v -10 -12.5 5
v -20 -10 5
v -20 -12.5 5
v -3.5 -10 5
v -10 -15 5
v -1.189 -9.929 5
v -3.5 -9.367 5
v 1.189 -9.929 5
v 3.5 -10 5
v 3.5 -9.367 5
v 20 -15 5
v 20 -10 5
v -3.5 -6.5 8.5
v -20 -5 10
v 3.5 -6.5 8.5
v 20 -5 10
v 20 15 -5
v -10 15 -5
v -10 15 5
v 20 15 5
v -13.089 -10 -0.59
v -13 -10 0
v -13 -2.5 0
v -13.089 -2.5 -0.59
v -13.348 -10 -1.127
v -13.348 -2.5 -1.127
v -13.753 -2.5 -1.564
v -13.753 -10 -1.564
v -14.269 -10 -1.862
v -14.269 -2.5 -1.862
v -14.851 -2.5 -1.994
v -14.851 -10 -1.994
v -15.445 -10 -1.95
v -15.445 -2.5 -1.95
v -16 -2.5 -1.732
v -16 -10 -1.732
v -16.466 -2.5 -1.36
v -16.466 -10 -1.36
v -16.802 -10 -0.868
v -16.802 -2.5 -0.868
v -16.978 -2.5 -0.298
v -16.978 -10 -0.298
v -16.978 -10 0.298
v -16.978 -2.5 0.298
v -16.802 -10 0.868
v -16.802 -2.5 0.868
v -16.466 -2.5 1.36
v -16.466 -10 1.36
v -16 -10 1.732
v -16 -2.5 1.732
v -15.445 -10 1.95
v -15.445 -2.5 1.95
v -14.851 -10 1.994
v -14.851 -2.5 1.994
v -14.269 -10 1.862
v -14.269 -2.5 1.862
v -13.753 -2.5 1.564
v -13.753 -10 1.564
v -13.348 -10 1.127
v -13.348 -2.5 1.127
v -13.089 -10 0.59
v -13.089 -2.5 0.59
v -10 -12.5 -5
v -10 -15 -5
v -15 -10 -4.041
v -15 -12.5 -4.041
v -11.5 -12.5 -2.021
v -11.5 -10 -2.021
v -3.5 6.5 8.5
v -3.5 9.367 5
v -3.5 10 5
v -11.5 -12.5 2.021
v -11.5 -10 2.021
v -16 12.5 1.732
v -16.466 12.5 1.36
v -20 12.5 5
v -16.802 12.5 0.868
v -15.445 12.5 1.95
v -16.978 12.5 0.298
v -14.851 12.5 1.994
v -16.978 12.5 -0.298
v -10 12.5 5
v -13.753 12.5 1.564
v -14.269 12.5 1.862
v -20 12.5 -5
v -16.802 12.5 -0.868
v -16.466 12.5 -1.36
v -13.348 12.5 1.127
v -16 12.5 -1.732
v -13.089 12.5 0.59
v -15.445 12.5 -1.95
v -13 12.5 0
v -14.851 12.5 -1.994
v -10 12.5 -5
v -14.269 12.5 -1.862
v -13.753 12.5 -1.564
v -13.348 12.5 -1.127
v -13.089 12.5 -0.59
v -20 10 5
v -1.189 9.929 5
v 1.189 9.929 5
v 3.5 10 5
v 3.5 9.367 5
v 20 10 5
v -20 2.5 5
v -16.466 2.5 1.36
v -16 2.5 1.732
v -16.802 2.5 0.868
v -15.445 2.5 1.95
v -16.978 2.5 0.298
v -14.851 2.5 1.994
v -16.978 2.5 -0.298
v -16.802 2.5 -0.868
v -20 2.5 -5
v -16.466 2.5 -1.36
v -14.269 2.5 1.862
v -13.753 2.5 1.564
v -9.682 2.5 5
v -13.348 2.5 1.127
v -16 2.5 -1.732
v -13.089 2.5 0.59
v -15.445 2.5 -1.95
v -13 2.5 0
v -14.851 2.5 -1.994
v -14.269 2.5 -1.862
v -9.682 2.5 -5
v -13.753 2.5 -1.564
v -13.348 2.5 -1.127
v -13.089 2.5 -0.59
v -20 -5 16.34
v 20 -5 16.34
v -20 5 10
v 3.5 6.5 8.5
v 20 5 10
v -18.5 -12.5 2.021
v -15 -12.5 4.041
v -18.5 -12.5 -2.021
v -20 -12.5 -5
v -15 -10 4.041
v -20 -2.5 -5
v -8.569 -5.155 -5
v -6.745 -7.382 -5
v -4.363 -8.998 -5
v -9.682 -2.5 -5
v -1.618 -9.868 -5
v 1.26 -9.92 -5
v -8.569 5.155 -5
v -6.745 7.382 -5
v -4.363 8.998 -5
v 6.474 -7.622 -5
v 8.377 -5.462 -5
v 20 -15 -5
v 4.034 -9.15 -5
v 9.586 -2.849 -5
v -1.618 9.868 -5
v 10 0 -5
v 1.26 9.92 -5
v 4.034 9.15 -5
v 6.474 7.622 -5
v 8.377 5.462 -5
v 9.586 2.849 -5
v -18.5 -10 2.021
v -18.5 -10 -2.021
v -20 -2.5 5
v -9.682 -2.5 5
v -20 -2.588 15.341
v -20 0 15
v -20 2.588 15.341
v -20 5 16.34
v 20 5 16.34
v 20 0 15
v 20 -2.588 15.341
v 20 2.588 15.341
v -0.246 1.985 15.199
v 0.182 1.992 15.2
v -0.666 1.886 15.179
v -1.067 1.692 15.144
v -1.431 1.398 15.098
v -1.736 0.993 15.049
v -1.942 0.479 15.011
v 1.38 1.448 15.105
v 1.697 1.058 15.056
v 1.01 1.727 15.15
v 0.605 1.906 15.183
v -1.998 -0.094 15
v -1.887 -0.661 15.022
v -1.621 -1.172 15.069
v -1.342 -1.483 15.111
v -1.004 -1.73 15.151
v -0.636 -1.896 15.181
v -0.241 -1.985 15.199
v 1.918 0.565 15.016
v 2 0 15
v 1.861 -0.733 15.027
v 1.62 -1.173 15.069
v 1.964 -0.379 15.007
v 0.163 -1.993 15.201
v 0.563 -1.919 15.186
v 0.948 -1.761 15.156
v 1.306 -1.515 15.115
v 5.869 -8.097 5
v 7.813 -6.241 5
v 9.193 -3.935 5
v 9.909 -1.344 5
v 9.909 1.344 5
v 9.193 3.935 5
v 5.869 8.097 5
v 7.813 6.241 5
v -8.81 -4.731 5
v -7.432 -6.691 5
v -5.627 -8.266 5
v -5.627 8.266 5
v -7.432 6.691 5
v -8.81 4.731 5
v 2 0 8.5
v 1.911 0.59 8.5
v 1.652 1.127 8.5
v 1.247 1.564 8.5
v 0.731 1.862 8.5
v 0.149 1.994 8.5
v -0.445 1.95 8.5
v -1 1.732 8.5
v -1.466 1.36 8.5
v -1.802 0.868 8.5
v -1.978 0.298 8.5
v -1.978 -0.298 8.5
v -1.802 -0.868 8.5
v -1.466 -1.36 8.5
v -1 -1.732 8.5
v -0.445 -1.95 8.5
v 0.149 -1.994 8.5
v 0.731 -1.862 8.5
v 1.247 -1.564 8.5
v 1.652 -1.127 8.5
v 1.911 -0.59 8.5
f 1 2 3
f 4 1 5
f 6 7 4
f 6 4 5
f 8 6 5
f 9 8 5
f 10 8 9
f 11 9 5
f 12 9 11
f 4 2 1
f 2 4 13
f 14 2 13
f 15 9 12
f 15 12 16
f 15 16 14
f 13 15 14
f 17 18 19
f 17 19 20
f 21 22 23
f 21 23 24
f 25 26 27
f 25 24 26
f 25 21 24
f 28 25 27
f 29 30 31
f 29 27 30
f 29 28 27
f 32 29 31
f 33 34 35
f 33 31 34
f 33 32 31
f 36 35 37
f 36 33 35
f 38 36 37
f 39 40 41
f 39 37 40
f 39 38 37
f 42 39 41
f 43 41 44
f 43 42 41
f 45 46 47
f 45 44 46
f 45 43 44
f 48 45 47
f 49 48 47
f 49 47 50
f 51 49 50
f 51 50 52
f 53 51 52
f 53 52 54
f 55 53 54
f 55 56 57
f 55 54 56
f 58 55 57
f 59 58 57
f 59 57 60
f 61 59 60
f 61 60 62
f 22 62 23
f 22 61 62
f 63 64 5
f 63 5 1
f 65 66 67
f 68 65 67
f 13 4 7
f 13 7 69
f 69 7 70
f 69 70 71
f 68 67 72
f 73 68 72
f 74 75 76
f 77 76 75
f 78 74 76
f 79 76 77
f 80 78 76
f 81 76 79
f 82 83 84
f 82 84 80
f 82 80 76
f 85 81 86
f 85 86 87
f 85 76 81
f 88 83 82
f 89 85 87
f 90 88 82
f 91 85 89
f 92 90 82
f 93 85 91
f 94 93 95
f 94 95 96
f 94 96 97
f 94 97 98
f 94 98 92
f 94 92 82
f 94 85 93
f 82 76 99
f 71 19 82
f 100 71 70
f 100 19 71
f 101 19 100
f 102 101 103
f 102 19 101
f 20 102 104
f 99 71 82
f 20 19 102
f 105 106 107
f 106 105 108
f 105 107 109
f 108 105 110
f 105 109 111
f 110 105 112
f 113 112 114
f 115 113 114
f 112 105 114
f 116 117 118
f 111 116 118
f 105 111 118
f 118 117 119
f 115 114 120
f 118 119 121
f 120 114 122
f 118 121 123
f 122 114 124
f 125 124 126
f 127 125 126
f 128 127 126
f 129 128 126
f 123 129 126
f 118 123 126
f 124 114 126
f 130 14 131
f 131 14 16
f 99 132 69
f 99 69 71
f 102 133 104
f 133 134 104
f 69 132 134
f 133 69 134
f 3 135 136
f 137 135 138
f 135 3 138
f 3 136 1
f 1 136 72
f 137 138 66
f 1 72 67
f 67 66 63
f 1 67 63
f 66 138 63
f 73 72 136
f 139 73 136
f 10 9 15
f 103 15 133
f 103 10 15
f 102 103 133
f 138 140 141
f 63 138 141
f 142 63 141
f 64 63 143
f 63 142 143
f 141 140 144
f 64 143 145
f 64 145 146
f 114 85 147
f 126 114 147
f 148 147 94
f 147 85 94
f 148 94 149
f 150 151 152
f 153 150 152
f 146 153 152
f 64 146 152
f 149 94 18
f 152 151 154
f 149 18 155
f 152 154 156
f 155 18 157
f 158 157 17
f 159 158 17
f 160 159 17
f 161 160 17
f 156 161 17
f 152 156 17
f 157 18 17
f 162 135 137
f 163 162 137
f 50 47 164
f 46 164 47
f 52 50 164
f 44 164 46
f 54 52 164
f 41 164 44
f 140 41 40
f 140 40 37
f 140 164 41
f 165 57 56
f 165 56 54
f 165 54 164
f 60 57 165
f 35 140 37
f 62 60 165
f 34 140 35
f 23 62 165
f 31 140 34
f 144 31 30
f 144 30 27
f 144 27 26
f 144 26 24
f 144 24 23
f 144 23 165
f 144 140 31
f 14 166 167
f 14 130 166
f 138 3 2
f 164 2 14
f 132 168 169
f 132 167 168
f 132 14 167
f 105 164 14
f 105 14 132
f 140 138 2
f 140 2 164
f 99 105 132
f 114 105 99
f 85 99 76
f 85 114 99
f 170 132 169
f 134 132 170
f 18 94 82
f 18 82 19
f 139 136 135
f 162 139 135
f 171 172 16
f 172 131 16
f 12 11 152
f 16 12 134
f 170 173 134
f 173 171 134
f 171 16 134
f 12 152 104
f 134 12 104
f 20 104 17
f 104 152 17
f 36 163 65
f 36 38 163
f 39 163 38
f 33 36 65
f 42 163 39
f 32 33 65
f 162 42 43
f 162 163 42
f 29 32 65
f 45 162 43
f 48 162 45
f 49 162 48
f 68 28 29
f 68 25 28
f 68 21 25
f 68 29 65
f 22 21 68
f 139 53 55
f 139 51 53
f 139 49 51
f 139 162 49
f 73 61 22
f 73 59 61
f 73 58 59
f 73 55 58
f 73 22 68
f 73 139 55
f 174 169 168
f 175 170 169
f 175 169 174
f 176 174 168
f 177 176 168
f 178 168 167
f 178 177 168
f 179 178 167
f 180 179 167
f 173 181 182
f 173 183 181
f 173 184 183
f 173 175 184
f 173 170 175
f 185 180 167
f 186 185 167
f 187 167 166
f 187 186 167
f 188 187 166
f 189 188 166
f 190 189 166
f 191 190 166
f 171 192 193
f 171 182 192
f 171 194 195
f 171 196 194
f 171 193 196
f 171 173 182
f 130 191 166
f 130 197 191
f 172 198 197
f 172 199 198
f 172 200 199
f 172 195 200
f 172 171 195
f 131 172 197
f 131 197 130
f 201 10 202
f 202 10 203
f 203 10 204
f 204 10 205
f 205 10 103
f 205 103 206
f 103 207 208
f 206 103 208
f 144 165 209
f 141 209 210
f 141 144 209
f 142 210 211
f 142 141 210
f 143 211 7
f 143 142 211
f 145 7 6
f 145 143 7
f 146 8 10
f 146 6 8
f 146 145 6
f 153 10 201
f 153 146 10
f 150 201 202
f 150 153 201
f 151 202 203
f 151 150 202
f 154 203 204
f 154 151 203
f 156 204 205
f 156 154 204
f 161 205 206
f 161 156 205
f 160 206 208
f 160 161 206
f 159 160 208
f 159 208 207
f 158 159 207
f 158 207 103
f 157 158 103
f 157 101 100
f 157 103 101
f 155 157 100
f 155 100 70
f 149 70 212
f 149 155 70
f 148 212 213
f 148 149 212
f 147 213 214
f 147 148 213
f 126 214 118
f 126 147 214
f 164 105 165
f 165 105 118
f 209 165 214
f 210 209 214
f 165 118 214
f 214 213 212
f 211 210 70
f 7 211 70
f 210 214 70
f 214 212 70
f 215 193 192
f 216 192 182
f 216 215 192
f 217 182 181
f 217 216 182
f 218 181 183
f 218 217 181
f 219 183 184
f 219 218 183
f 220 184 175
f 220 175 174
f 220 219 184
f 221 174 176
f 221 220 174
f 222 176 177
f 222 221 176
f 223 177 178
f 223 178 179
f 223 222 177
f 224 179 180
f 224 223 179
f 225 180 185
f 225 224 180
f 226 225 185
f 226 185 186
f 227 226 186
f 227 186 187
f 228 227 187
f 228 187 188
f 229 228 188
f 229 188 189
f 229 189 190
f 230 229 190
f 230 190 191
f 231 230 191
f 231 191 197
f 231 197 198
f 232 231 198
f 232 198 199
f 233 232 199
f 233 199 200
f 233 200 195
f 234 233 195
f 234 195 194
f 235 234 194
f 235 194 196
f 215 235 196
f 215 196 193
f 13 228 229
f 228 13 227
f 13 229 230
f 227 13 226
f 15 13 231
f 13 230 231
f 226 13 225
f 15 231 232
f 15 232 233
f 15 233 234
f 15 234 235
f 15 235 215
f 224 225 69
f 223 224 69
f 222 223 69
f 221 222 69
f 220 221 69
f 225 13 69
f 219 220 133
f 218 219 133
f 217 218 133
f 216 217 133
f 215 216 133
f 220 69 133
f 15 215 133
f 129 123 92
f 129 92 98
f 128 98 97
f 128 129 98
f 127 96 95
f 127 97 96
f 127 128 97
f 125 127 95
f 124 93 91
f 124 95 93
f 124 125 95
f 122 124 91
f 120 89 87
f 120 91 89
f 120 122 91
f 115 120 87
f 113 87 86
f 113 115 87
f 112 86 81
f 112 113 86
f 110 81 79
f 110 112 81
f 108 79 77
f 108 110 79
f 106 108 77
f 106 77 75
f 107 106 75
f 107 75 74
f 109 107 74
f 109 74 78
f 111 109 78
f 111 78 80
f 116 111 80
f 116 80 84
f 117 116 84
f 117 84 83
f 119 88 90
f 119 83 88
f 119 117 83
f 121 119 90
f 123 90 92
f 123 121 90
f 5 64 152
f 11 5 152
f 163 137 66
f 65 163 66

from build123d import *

# Parameters (mm, degrees)
BOX002_W               = 12.5
BOX002_H               = 5
BOX002_DEPTH           = 10
CYLINDER003_R          = 2
CYLINDER003_DEPTH      = 30
CYLINDER003_ROLL_ANGLE = -90
CYLINDER_R             = 2
CYLINDER_DEPTH         = 30
CYLINDER007_R          = 10
CYLINDER007_DEPTH      = 40
BOX008_W               = 10
BOX008_H               = 2.5
BOX008_DEPTH           = 10
BOX009_W               = 10
BOX009_H               = 2.5
BOX009_DEPTH           = 10
PAD_DEPTH              = 2.5
BOX010_W               = 7
BOX010_H               = 20
BOX010_DEPTH           = 3.5
CYLINDER001_R          = 10
CYLINDER001_DEPTH      = 10
PAD001_DEPTH           = 40
BOX007_W               = 40
BOX007_H               = 30
BOX007_DEPTH           = 10
BOX_W                  = 40
BOX_H                  = 10
BOX_DEPTH              = 12


with BuildPart() as screw_gap:
    # Box002 → Box002 (new body)
    with BuildSketch(Plane(origin=(-20, -2.5, -5), x_dir=(1, 0, 0), z_dir=(0, 0, 1))):
        with Locations((6.25, 2.5)):
            Rectangle(BOX002_W, BOX002_H)
    extrude(amount=BOX002_DEPTH)


with BuildPart() as screw:
    # Cylinder003 → Cylinder003 (new body)
    with BuildSketch(Plane.XY):
        Circle(CYLINDER003_R)
    extrude(amount=CYLINDER003_DEPTH)


with BuildPart() as screw_1:
    # Cylinder003 roll: moved
    add(screw.part.rotate(Axis((0, 0, 0), (1, 0, 0)), CYLINDER003_ROLL_ANGLE))


with BuildPart() as screw_2:
    # Cylinder003 placement: moved
    add(screw_1.part.moved(Location((-15, -15, 0))))


with BuildPart() as rail_screw:
    # Cylinder → Cylinder (new body)
    with BuildSketch(Plane.XY.offset(-5)):
        Circle(CYLINDER_R)
    extrude(amount=CYLINDER_DEPTH)


with BuildPart() as rail:
    # Cylinder007 → Cylinder007 (new body)
    with BuildSketch(Plane(origin=(20, 0, 25), x_dir=(0, 1, 0), z_dir=(-1, 0, 0))):
        Circle(CYLINDER007_R)
    extrude(amount=CYLINDER007_DEPTH)


with BuildPart() as screw_gap001:
    # Box008 → Box008 (new body)
    with BuildSketch(Plane(origin=(-20, 12.5, -5), x_dir=(1, 0, 0), z_dir=(0, 0, 1))):
        with Locations((5, 1.25)):
            Rectangle(BOX008_W, BOX008_H)
    extrude(amount=BOX008_DEPTH)


with BuildPart() as screw_gap002:
    # Box009 → Box009 (new body)
    with BuildSketch(Plane(origin=(-20, -15, -5), x_dir=(1, 0, 0), z_dir=(0, 0, 1))):
        with Locations((5, 1.25)):
            Rectangle(BOX009_W, BOX009_H)
    extrude(amount=BOX009_DEPTH)


with BuildPart() as body:
    # Sketch → Pad (new body)
    with BuildSketch(Plane.XZ):
        Polygon((0, -4.041452), (3.5, -2.020726), (3.5, 2.020726), (0, 4.041452), (-3.5, 2.020726), (-3.5, -2.020726), align=None)
    extrude(amount=-PAD_DEPTH)


with BuildPart() as body_1:
    # Body placement: moved
    add(body.part.moved(Location((-15, -12.5, 0))))


with BuildPart() as cube:
    # Box010 → Box010 (new body)
    with BuildSketch(Plane(origin=(-3.5, -10, 5), x_dir=(1, 0, 0), z_dir=(0, 0, 1))):
        with Locations((3.5, 10)):
            Rectangle(BOX010_W, BOX010_H)
    extrude(amount=BOX010_DEPTH)


with BuildPart() as negative_fusion:
    # Cylinder001 → Cylinder001 (new body)
    with BuildSketch(Plane.XY.offset(-5)):
        Circle(CYLINDER001_R)
    extrude(amount=CYLINDER001_DEPTH)

    # Fusion: union Screw Gap, Screw, Rail Screw, Rail, Screw Gap001, Screw Gap002, Body, Cube
    add(screw_gap.part)
    add(screw_2.part)
    add(rail_screw.part)
    add(rail.part)
    add(screw_gap001.part)
    add(screw_gap002.part)
    add(body_1.part)
    add(cube.part)


with BuildPart() as rail_support_prism:
    # Sketch001 → Pad001 (new body)
    with BuildSketch(Plane.YZ):
        Polygon((5, 0), (10, -5), (-10, -5), (-5, 0), align=None)
    extrude(amount=-PAD001_DEPTH)


with BuildPart() as rail_support_prism_1:
    # Body001 placement: moved
    add(rail_support_prism.part.moved(Location((20, 0, 10))))


with BuildPart() as base_cube:
    # Box007 → Box007 (new body)
    with BuildSketch(Plane(origin=(-20, -15, -5), x_dir=(1, 0, 0), z_dir=(0, 0, 1))):
        with Locations((20, 15)):
            Rectangle(BOX007_W, BOX007_H)
    extrude(amount=BOX007_DEPTH)


with BuildPart() as cut:
    # Box → Box (new body)
    with BuildSketch(Plane(origin=(-20, -5, 5), x_dir=(1, 0, 0), z_dir=(0, 0, 1))):
        with Locations((20, 5)):
            Rectangle(BOX_W, BOX_H)
    extrude(amount=BOX_DEPTH)

    # Fusion002: union Rail Support Prism, Base Cube
    add(rail_support_prism_1.part)
    add(base_cube.part)

    # Cut: cut Negative Fusion
    add(negative_fusion.part, mode=Mode.SUBTRACT)


solid = cut.part
